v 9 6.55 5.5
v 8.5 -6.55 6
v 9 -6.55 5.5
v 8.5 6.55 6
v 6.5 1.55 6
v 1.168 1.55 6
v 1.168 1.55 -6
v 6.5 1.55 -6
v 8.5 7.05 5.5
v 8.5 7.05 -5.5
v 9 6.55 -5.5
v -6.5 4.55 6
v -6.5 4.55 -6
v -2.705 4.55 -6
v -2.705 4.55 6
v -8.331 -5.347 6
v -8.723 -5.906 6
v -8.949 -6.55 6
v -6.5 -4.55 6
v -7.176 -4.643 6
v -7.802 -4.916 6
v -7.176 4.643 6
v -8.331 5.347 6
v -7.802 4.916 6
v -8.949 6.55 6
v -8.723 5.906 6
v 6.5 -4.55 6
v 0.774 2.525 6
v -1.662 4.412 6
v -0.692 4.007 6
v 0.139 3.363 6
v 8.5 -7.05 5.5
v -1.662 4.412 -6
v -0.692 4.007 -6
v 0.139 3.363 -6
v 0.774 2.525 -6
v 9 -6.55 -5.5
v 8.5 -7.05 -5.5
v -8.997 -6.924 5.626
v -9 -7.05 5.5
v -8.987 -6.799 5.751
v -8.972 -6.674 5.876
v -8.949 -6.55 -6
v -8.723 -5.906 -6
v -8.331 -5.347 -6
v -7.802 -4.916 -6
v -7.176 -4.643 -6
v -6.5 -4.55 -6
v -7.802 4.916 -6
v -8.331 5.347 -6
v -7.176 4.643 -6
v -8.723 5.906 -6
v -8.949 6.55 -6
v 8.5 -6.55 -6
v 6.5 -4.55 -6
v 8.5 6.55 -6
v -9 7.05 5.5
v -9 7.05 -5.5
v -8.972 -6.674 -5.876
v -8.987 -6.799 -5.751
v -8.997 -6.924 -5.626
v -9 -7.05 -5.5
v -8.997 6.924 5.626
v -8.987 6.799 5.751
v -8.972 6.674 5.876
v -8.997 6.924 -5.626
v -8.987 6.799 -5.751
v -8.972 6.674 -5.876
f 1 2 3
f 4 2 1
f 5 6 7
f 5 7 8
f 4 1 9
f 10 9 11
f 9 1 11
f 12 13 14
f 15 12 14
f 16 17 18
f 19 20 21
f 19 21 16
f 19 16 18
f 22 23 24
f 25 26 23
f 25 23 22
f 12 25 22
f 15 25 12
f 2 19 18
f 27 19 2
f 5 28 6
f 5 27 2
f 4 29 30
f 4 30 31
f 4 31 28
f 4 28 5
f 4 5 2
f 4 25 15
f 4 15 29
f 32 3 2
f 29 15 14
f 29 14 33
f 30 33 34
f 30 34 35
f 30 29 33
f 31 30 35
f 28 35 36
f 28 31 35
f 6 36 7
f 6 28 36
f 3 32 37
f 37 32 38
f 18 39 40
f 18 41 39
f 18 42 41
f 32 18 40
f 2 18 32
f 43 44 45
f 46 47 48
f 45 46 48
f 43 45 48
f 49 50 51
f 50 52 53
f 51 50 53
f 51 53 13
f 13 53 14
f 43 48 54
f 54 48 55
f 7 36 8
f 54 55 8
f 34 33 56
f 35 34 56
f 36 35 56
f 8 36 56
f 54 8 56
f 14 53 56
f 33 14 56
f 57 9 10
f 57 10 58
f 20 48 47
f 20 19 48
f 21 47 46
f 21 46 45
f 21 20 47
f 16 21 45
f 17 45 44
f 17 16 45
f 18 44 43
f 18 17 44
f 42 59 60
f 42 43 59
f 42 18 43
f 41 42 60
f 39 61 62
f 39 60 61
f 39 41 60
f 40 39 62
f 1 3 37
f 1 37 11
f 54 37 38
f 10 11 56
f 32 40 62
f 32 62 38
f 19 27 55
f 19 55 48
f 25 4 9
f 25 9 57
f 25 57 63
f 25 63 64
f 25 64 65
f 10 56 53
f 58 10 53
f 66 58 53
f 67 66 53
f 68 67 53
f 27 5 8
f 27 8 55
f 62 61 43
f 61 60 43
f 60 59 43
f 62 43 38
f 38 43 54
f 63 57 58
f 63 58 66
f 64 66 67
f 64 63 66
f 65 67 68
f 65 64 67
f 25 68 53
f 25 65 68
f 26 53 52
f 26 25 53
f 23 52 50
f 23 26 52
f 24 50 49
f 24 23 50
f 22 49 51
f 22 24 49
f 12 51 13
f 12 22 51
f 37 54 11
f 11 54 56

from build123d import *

# Parameters (mm, degrees)
F1_DEPTH = 6
F2_SIZE  = 0.5


with BuildPart() as f1:
    # F0 (on Top) → F1 (new body, symmetric)
    with BuildSketch(Plane.XY):
        with BuildLine():
            Line((9, 7.05), (-9, 7.05))
            ThreePointArc((-9, 7.05), (-8.267767, 5.282233), (-6.5, 4.55))
            Line((-6.5, 4.55), (-2.70464, 4.55))
            ThreePointArc((-2.70464, 4.55), (-0.25515, 3.712278), (1.168343, 1.55))
            Line((1.168343, 1.55), (6.5, 1.55))
            Line((6.5, 1.55), (6.5, -4.55))
            Line((6.5, -4.55), (-6.5, -4.55))
            ThreePointArc((-6.5, -4.55), (-8.267767, -5.282233), (-9, -7.05))
            Line((-9, -7.05), (9, -7.05))
            Line((9, -7.05), (9, 7.05))
        make_face()
    extrude(amount=F1_DEPTH, both=True)

    # F2
    f2_edges = [f1.edges().sort_by_distance(p)[0] for p in [
        (9, 7.05, 0),
        (9, -7.05, 0),
        (9, 0, 6),
        (9, 0, -6),
        (0, 7.05, -6),
        (0, 7.05, 6),
        (0, -7.05, 6),
        (0, -7.05, -6),
    ]]
    chamfer(f2_edges, length=F2_SIZE)


with BuildPart() as f3_1:
    # F3: copy of F1
    add(f1.part.moved(Location((26.4, 0, 0))))


solid = f1.part
